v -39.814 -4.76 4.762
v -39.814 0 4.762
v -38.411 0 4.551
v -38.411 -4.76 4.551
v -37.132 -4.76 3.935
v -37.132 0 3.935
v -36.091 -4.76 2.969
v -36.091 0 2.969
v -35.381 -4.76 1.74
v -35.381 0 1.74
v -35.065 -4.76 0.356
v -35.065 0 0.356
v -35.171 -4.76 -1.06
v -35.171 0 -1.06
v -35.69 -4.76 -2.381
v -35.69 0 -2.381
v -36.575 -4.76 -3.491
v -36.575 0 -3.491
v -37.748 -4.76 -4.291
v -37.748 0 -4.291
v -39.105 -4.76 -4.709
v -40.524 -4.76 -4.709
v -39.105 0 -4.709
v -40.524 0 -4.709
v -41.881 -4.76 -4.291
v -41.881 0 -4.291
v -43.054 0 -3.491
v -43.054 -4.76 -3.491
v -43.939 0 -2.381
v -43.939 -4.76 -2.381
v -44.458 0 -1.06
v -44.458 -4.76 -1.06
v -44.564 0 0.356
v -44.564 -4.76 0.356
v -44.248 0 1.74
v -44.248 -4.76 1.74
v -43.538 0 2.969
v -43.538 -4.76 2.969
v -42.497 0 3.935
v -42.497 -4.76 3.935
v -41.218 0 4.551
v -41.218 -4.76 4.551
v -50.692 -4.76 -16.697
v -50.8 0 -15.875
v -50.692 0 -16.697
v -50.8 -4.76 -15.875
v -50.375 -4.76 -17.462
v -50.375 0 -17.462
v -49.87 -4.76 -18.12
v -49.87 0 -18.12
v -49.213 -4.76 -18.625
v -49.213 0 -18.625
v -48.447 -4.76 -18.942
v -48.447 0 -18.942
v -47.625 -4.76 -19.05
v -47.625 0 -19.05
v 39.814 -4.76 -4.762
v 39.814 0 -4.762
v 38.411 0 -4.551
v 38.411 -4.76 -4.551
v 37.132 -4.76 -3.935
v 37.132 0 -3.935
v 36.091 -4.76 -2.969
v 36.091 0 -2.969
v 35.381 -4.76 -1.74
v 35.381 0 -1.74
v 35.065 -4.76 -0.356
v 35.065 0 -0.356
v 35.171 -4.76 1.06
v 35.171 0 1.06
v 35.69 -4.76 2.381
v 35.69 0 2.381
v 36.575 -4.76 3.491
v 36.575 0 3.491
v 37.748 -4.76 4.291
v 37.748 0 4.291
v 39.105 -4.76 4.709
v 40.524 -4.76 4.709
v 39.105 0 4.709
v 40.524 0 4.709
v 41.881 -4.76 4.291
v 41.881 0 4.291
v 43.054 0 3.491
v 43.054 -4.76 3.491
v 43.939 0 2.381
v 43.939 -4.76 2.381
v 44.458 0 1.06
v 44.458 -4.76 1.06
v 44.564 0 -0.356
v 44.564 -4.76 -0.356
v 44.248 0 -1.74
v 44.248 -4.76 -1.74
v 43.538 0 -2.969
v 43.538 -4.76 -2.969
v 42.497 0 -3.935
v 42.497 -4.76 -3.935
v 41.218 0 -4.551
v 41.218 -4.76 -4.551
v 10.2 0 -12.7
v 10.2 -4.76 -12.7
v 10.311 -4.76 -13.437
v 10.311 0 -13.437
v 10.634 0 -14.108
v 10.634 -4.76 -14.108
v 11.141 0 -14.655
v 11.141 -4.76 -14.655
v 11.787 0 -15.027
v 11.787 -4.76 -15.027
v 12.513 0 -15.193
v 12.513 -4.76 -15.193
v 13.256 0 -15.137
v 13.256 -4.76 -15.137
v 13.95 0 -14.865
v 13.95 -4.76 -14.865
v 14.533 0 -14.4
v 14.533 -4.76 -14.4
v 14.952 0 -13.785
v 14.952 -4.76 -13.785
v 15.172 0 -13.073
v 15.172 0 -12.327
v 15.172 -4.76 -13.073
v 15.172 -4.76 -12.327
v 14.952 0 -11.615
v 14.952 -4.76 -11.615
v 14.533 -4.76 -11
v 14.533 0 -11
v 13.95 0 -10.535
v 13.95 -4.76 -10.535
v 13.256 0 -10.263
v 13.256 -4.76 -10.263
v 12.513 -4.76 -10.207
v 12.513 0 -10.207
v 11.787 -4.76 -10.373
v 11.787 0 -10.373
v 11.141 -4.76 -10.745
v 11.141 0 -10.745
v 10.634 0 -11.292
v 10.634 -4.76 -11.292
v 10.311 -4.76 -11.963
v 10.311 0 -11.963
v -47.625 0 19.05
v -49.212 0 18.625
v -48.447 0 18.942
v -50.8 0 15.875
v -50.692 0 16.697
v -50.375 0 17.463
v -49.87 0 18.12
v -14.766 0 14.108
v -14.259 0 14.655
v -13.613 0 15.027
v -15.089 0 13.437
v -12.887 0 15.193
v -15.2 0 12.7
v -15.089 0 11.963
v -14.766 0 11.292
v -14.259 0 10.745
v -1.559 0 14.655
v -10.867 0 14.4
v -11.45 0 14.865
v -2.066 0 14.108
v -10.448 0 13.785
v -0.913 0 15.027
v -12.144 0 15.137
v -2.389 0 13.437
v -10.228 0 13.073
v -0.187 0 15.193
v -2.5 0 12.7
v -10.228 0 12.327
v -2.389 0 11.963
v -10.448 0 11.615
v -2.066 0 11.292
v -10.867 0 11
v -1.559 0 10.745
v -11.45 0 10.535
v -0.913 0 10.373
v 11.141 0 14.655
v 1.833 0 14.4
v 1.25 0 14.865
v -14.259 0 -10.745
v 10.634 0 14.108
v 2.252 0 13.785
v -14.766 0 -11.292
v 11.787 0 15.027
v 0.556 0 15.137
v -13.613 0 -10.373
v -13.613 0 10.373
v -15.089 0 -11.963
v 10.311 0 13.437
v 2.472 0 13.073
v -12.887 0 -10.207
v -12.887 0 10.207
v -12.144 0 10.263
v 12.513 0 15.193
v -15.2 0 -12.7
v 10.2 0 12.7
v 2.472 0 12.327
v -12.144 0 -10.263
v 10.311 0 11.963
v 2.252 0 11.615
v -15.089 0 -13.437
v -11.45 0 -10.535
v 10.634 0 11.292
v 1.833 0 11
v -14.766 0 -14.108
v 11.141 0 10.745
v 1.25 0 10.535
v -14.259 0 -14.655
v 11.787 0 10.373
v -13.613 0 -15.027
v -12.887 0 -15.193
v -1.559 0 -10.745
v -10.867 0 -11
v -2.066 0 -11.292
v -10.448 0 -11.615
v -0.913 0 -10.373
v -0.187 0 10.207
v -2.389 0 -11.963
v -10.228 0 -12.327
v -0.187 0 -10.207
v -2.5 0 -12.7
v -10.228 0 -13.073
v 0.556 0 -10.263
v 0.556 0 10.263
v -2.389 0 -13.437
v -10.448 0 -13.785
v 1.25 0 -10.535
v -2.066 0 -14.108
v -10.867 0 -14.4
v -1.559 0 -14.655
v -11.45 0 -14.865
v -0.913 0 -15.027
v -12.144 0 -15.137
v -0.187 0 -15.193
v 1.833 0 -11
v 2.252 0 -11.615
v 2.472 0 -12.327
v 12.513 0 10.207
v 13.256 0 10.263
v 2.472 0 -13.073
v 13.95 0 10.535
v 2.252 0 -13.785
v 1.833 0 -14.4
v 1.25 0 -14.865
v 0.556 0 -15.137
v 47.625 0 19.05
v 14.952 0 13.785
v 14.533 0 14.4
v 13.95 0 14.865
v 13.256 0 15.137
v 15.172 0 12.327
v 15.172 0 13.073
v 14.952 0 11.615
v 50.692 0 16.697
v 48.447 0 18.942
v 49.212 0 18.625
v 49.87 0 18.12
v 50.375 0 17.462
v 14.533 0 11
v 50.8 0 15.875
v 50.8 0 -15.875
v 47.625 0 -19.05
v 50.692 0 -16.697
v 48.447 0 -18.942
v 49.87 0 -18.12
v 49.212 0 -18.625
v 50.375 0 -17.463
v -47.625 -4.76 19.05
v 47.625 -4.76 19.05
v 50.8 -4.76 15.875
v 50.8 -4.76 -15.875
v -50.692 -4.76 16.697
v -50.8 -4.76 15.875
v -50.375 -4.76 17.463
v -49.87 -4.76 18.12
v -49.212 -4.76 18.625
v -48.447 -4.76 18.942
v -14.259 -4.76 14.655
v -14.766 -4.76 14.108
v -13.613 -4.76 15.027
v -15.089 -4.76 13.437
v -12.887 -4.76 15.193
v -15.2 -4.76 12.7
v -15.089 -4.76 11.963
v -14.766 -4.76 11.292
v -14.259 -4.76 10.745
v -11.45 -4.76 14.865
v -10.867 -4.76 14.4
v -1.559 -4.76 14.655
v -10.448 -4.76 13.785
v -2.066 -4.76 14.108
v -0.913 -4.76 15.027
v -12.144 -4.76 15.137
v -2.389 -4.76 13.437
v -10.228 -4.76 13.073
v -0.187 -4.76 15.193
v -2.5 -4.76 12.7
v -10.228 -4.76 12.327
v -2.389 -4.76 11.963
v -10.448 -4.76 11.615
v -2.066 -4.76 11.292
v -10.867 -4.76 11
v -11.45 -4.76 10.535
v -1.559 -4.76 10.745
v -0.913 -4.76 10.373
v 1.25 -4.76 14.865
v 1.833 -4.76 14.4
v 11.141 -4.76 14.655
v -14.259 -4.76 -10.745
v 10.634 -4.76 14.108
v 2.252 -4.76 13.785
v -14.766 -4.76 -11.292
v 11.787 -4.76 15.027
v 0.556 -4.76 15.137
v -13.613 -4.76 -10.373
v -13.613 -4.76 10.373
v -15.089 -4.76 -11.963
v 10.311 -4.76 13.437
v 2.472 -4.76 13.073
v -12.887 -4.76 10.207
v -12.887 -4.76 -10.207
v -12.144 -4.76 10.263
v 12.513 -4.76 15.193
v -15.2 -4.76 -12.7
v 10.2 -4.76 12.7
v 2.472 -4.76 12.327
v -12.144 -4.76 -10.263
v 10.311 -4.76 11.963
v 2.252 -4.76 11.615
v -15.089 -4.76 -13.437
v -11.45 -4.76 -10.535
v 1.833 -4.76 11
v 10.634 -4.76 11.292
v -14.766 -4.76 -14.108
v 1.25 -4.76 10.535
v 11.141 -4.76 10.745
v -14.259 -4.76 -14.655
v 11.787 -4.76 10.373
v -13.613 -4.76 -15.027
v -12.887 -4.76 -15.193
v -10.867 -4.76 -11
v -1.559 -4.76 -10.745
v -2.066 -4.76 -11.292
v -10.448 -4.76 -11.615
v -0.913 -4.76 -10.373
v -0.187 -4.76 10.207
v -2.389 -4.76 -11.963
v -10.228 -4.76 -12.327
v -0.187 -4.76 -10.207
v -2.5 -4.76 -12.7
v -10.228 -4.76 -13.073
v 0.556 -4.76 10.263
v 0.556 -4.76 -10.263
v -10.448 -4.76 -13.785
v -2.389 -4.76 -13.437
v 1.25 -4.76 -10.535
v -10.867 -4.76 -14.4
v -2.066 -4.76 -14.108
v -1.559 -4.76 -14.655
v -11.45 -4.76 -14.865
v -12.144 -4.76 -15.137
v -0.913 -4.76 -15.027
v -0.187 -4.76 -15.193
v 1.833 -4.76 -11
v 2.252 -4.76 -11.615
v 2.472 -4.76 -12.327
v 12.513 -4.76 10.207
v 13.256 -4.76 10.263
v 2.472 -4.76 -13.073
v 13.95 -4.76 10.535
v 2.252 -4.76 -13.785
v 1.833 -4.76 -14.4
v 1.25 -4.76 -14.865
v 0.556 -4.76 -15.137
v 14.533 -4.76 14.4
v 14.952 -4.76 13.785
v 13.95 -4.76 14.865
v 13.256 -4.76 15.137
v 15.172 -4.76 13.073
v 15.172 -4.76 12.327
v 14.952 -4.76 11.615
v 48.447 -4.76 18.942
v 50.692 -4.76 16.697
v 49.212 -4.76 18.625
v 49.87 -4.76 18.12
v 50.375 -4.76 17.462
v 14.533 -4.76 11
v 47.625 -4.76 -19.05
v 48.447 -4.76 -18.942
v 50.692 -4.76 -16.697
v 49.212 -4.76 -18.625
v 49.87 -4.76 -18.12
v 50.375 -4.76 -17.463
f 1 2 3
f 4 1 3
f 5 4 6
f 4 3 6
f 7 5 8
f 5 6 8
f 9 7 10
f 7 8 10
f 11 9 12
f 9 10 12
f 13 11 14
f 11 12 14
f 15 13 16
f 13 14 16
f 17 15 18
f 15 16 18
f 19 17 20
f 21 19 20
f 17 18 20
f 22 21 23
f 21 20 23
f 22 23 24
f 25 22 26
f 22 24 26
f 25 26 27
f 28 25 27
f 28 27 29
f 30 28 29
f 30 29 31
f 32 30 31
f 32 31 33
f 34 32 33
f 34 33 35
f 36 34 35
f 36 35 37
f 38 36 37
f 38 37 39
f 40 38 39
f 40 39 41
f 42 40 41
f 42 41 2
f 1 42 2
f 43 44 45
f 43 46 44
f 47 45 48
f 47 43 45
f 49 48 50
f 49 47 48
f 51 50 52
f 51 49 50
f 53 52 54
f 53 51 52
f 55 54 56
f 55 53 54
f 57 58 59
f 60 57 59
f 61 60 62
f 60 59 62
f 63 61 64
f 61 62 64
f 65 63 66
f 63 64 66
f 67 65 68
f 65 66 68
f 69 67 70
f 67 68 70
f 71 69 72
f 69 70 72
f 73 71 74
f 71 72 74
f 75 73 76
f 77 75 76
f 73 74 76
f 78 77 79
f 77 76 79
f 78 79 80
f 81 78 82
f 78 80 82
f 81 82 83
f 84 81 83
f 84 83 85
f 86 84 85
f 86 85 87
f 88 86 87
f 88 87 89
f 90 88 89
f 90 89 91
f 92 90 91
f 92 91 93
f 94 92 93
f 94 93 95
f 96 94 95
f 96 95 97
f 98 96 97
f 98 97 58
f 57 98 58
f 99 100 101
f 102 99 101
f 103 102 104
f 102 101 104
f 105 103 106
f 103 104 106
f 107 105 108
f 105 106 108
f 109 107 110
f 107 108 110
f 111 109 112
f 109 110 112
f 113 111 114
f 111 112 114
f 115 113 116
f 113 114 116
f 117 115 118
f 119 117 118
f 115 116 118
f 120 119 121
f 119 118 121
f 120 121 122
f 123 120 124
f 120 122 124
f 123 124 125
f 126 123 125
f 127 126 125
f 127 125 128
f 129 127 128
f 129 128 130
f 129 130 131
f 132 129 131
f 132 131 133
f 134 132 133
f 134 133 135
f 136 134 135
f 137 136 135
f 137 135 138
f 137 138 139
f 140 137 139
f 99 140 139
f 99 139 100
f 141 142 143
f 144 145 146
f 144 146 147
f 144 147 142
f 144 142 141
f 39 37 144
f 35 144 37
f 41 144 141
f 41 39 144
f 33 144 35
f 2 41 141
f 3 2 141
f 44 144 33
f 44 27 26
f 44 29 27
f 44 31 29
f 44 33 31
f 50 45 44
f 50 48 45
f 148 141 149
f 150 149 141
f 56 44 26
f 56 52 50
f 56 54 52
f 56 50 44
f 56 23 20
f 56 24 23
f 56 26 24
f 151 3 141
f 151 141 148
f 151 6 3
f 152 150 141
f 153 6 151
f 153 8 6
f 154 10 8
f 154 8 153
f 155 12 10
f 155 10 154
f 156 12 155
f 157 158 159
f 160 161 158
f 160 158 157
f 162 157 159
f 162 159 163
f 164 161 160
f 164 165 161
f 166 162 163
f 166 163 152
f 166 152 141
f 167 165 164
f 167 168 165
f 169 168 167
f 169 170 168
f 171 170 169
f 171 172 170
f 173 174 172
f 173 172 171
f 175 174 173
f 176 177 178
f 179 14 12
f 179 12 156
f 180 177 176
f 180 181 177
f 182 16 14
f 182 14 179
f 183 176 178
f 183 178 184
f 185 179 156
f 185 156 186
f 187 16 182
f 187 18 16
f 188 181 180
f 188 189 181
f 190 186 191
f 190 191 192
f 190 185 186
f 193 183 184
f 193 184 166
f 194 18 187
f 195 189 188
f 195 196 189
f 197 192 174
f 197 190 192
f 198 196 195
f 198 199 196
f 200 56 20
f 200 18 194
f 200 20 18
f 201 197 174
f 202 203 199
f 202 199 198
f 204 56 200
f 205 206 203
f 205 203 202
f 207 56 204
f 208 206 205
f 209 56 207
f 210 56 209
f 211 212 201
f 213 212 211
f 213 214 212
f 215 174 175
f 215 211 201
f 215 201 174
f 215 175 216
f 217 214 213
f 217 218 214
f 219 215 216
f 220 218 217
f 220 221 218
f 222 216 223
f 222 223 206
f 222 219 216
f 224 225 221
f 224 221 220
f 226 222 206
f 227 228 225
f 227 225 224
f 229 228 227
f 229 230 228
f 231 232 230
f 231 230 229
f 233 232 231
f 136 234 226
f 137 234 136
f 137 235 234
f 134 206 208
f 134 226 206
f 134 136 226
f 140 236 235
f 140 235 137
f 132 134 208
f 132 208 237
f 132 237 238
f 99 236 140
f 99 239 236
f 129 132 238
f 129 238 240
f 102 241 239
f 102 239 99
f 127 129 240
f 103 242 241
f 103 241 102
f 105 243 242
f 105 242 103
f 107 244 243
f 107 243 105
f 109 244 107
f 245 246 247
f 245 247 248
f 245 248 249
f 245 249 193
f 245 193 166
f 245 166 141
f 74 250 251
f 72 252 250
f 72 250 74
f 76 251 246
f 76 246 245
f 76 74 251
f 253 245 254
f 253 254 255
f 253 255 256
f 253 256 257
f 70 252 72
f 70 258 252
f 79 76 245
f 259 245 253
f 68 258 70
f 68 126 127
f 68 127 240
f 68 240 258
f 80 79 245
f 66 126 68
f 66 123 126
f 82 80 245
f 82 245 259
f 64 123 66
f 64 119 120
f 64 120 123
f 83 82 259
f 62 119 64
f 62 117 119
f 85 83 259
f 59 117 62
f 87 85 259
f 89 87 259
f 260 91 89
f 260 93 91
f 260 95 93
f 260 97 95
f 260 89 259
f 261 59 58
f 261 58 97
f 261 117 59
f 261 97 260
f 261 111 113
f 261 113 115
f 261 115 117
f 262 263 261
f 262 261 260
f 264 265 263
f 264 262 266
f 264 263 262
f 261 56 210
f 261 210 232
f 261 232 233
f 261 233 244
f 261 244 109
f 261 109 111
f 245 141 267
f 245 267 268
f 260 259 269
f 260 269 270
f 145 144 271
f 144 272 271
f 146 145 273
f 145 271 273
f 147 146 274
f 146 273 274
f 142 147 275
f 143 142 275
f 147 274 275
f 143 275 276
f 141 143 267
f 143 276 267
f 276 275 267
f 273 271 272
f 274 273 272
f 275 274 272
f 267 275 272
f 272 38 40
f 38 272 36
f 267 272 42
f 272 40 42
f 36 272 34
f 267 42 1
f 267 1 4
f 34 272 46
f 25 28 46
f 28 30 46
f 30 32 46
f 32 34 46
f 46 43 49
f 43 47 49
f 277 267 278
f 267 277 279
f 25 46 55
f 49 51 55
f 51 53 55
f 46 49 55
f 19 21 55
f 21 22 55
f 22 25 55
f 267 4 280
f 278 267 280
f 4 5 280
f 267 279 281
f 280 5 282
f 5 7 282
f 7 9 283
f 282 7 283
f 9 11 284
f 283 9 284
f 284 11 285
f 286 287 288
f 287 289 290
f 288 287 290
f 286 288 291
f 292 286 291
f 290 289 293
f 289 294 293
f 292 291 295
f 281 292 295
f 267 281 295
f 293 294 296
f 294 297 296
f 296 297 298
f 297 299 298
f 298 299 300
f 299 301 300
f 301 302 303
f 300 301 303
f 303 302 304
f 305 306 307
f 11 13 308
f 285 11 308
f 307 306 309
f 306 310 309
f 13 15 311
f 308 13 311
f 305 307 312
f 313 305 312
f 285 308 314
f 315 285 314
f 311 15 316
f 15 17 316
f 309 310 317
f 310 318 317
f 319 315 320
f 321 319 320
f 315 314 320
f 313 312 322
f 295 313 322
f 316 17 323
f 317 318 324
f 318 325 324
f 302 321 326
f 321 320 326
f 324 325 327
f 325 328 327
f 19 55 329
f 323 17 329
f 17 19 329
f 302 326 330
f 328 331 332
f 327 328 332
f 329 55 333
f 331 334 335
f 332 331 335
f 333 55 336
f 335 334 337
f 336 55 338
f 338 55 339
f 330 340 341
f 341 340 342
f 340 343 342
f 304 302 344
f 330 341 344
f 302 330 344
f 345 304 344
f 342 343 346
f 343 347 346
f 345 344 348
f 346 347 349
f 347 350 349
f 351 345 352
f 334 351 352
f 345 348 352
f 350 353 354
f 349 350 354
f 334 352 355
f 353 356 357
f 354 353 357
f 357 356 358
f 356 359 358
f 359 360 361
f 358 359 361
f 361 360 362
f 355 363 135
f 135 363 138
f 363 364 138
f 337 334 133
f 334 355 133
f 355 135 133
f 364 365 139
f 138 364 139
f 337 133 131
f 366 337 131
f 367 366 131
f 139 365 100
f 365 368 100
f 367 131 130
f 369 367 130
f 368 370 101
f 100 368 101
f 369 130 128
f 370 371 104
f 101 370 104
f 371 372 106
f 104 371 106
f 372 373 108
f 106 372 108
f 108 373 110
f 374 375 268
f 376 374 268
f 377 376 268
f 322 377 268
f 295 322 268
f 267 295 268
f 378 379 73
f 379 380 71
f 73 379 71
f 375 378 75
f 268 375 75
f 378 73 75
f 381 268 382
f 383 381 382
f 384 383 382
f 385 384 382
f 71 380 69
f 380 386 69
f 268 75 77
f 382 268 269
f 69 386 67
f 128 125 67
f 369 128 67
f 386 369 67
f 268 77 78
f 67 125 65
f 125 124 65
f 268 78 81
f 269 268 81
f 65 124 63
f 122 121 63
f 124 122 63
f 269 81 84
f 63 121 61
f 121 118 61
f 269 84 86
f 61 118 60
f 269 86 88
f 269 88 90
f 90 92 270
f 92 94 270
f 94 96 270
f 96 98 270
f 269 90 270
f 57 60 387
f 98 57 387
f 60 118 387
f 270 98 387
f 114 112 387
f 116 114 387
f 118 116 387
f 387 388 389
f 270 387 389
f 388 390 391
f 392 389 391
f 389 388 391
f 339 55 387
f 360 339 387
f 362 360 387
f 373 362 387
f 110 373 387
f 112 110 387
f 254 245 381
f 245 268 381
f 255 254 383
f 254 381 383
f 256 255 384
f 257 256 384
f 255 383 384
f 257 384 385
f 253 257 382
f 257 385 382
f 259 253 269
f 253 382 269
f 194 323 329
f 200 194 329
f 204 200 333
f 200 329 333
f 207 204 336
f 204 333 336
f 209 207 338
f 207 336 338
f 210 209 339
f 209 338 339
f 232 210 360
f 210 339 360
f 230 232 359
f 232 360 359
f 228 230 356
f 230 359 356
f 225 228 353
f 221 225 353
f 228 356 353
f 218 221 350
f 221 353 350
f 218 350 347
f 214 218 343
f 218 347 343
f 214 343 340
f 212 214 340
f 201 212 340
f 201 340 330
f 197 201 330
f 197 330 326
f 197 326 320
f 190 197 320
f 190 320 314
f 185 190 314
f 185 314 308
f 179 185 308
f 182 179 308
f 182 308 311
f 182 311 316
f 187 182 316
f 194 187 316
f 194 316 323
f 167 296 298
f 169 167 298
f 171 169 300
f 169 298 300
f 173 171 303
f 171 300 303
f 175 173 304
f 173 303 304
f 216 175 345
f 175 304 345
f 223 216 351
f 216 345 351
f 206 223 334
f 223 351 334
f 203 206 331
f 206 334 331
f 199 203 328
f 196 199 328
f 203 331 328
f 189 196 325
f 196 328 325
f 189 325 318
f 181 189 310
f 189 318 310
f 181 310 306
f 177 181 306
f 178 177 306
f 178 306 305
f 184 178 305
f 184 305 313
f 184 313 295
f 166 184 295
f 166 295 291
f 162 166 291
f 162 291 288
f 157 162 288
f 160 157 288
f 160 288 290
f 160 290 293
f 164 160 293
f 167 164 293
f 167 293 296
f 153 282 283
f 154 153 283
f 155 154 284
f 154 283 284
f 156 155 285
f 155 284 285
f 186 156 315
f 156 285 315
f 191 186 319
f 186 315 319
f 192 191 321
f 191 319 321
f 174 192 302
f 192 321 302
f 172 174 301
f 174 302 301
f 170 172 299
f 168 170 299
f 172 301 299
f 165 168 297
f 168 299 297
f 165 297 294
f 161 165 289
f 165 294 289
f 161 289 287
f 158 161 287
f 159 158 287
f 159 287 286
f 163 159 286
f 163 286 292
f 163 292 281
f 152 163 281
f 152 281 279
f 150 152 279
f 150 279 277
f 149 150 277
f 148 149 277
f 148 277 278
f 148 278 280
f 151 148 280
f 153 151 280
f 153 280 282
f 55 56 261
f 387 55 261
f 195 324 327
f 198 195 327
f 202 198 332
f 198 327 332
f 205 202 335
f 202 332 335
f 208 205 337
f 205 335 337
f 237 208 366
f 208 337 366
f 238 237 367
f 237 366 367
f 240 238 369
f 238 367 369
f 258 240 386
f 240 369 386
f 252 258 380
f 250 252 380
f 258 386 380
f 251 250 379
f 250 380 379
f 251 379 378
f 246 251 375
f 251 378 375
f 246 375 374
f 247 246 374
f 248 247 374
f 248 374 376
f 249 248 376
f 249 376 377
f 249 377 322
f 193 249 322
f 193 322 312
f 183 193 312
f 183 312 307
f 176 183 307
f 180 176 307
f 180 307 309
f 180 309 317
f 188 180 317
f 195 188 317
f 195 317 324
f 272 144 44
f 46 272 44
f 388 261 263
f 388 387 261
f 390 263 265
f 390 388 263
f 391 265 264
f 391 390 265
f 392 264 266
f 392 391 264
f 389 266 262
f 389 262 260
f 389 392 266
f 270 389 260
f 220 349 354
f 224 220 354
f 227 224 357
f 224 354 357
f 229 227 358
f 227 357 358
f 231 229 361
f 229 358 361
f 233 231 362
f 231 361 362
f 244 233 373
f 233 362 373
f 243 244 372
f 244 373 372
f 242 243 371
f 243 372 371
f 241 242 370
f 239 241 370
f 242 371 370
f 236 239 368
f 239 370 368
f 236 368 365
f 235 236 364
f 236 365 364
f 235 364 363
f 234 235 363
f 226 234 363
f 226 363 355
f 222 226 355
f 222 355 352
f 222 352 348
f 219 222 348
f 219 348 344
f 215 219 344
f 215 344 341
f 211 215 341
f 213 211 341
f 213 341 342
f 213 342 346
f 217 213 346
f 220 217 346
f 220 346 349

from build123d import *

# Parameters (mm, degrees)
ESQUISSE1_W                   = 101.6
ESQUISSE1_H                   = 38.1
T_LE_DE_BASE_PLI_E1_DEPTH     = 4.76
ESQUISSE13_R                  = 4.7625
ENL_V_MAT_EXTRU_3_DEPTH       = 55.46283228
DIAM_TRE_DU_PER_AGE_5_0_5_1_D = 5
R_P_TITION_LIN_AIRE1_COUNT    = 2
R_P_TITION_LIN_AIRE1_PITCH    = 25.4
CONG_2_R                      = 3.175


# Sheet-metal steps are written as plain solids
with BuildPart() as part:
    # Esquisse1 → Tôle de base pliée1 (new body)
    with BuildSketch(Plane(origin=(0, 0, 0), x_dir=(1, 0, 0), z_dir=(0, 1, 0))):
        Rectangle(ESQUISSE1_W, ESQUISSE1_H)
    extrude(amount=-T_LE_DE_BASE_PLI_E1_DEPTH)

    # Esquisse13 → Enlèv. mat.-Extru.3 (cut, through all)
    with BuildSketch(Plane(origin=(0, 0, 0), x_dir=(1, 0, 0), z_dir=(0, 1, 0))):
        with Locations(Location((-39.8145, 0, 0), (0, 0, 270))):
            Circle(ESQUISSE13_R)
        with Locations(Location((39.8145, 0, 0), (0, 0, 90))):
            Circle(ESQUISSE13_R)
    extrude(amount=-ENL_V_MAT_EXTRU_3_DEPTH, mode=Mode.SUBTRACT)

    # Diamètre du perçage Ø5.0 (5)1 (through all)
    with Locations(Plane(origin=(0, 0, 0), x_dir=(1, 0, 0), z_dir=(0, 1, 0))):
        with Locations((-12.7, 12.7), (0, 12.7), (12.7, 12.7)):
            diam_tre_du_per_age_5_0_5_1 = Hole(DIAM_TRE_DU_PER_AGE_5_0_5_1_D / 2)

    # Répétition linéaire1: Diamètre du perçage Ø5.0 (5)1 ×2
    with Locations(*[(0, 0, i * R_P_TITION_LIN_AIRE1_PITCH) for i in range(1, R_P_TITION_LIN_AIRE1_COUNT)]):
        add(diam_tre_du_per_age_5_0_5_1, mode=Mode.SUBTRACT)

    # Congé2
    cong_2_edges = [part.edges().sort_by_distance(p)[0] for p in [
        (-50.8, -2.38, -19.05),
        (50.8, -2.38, -19.05),
        (50.8, -2.38, 19.05),
        (-50.8, -2.38, 19.05),
    ]]
    fillet(cong_2_edges, radius=CONG_2_R)


solid = part.part
